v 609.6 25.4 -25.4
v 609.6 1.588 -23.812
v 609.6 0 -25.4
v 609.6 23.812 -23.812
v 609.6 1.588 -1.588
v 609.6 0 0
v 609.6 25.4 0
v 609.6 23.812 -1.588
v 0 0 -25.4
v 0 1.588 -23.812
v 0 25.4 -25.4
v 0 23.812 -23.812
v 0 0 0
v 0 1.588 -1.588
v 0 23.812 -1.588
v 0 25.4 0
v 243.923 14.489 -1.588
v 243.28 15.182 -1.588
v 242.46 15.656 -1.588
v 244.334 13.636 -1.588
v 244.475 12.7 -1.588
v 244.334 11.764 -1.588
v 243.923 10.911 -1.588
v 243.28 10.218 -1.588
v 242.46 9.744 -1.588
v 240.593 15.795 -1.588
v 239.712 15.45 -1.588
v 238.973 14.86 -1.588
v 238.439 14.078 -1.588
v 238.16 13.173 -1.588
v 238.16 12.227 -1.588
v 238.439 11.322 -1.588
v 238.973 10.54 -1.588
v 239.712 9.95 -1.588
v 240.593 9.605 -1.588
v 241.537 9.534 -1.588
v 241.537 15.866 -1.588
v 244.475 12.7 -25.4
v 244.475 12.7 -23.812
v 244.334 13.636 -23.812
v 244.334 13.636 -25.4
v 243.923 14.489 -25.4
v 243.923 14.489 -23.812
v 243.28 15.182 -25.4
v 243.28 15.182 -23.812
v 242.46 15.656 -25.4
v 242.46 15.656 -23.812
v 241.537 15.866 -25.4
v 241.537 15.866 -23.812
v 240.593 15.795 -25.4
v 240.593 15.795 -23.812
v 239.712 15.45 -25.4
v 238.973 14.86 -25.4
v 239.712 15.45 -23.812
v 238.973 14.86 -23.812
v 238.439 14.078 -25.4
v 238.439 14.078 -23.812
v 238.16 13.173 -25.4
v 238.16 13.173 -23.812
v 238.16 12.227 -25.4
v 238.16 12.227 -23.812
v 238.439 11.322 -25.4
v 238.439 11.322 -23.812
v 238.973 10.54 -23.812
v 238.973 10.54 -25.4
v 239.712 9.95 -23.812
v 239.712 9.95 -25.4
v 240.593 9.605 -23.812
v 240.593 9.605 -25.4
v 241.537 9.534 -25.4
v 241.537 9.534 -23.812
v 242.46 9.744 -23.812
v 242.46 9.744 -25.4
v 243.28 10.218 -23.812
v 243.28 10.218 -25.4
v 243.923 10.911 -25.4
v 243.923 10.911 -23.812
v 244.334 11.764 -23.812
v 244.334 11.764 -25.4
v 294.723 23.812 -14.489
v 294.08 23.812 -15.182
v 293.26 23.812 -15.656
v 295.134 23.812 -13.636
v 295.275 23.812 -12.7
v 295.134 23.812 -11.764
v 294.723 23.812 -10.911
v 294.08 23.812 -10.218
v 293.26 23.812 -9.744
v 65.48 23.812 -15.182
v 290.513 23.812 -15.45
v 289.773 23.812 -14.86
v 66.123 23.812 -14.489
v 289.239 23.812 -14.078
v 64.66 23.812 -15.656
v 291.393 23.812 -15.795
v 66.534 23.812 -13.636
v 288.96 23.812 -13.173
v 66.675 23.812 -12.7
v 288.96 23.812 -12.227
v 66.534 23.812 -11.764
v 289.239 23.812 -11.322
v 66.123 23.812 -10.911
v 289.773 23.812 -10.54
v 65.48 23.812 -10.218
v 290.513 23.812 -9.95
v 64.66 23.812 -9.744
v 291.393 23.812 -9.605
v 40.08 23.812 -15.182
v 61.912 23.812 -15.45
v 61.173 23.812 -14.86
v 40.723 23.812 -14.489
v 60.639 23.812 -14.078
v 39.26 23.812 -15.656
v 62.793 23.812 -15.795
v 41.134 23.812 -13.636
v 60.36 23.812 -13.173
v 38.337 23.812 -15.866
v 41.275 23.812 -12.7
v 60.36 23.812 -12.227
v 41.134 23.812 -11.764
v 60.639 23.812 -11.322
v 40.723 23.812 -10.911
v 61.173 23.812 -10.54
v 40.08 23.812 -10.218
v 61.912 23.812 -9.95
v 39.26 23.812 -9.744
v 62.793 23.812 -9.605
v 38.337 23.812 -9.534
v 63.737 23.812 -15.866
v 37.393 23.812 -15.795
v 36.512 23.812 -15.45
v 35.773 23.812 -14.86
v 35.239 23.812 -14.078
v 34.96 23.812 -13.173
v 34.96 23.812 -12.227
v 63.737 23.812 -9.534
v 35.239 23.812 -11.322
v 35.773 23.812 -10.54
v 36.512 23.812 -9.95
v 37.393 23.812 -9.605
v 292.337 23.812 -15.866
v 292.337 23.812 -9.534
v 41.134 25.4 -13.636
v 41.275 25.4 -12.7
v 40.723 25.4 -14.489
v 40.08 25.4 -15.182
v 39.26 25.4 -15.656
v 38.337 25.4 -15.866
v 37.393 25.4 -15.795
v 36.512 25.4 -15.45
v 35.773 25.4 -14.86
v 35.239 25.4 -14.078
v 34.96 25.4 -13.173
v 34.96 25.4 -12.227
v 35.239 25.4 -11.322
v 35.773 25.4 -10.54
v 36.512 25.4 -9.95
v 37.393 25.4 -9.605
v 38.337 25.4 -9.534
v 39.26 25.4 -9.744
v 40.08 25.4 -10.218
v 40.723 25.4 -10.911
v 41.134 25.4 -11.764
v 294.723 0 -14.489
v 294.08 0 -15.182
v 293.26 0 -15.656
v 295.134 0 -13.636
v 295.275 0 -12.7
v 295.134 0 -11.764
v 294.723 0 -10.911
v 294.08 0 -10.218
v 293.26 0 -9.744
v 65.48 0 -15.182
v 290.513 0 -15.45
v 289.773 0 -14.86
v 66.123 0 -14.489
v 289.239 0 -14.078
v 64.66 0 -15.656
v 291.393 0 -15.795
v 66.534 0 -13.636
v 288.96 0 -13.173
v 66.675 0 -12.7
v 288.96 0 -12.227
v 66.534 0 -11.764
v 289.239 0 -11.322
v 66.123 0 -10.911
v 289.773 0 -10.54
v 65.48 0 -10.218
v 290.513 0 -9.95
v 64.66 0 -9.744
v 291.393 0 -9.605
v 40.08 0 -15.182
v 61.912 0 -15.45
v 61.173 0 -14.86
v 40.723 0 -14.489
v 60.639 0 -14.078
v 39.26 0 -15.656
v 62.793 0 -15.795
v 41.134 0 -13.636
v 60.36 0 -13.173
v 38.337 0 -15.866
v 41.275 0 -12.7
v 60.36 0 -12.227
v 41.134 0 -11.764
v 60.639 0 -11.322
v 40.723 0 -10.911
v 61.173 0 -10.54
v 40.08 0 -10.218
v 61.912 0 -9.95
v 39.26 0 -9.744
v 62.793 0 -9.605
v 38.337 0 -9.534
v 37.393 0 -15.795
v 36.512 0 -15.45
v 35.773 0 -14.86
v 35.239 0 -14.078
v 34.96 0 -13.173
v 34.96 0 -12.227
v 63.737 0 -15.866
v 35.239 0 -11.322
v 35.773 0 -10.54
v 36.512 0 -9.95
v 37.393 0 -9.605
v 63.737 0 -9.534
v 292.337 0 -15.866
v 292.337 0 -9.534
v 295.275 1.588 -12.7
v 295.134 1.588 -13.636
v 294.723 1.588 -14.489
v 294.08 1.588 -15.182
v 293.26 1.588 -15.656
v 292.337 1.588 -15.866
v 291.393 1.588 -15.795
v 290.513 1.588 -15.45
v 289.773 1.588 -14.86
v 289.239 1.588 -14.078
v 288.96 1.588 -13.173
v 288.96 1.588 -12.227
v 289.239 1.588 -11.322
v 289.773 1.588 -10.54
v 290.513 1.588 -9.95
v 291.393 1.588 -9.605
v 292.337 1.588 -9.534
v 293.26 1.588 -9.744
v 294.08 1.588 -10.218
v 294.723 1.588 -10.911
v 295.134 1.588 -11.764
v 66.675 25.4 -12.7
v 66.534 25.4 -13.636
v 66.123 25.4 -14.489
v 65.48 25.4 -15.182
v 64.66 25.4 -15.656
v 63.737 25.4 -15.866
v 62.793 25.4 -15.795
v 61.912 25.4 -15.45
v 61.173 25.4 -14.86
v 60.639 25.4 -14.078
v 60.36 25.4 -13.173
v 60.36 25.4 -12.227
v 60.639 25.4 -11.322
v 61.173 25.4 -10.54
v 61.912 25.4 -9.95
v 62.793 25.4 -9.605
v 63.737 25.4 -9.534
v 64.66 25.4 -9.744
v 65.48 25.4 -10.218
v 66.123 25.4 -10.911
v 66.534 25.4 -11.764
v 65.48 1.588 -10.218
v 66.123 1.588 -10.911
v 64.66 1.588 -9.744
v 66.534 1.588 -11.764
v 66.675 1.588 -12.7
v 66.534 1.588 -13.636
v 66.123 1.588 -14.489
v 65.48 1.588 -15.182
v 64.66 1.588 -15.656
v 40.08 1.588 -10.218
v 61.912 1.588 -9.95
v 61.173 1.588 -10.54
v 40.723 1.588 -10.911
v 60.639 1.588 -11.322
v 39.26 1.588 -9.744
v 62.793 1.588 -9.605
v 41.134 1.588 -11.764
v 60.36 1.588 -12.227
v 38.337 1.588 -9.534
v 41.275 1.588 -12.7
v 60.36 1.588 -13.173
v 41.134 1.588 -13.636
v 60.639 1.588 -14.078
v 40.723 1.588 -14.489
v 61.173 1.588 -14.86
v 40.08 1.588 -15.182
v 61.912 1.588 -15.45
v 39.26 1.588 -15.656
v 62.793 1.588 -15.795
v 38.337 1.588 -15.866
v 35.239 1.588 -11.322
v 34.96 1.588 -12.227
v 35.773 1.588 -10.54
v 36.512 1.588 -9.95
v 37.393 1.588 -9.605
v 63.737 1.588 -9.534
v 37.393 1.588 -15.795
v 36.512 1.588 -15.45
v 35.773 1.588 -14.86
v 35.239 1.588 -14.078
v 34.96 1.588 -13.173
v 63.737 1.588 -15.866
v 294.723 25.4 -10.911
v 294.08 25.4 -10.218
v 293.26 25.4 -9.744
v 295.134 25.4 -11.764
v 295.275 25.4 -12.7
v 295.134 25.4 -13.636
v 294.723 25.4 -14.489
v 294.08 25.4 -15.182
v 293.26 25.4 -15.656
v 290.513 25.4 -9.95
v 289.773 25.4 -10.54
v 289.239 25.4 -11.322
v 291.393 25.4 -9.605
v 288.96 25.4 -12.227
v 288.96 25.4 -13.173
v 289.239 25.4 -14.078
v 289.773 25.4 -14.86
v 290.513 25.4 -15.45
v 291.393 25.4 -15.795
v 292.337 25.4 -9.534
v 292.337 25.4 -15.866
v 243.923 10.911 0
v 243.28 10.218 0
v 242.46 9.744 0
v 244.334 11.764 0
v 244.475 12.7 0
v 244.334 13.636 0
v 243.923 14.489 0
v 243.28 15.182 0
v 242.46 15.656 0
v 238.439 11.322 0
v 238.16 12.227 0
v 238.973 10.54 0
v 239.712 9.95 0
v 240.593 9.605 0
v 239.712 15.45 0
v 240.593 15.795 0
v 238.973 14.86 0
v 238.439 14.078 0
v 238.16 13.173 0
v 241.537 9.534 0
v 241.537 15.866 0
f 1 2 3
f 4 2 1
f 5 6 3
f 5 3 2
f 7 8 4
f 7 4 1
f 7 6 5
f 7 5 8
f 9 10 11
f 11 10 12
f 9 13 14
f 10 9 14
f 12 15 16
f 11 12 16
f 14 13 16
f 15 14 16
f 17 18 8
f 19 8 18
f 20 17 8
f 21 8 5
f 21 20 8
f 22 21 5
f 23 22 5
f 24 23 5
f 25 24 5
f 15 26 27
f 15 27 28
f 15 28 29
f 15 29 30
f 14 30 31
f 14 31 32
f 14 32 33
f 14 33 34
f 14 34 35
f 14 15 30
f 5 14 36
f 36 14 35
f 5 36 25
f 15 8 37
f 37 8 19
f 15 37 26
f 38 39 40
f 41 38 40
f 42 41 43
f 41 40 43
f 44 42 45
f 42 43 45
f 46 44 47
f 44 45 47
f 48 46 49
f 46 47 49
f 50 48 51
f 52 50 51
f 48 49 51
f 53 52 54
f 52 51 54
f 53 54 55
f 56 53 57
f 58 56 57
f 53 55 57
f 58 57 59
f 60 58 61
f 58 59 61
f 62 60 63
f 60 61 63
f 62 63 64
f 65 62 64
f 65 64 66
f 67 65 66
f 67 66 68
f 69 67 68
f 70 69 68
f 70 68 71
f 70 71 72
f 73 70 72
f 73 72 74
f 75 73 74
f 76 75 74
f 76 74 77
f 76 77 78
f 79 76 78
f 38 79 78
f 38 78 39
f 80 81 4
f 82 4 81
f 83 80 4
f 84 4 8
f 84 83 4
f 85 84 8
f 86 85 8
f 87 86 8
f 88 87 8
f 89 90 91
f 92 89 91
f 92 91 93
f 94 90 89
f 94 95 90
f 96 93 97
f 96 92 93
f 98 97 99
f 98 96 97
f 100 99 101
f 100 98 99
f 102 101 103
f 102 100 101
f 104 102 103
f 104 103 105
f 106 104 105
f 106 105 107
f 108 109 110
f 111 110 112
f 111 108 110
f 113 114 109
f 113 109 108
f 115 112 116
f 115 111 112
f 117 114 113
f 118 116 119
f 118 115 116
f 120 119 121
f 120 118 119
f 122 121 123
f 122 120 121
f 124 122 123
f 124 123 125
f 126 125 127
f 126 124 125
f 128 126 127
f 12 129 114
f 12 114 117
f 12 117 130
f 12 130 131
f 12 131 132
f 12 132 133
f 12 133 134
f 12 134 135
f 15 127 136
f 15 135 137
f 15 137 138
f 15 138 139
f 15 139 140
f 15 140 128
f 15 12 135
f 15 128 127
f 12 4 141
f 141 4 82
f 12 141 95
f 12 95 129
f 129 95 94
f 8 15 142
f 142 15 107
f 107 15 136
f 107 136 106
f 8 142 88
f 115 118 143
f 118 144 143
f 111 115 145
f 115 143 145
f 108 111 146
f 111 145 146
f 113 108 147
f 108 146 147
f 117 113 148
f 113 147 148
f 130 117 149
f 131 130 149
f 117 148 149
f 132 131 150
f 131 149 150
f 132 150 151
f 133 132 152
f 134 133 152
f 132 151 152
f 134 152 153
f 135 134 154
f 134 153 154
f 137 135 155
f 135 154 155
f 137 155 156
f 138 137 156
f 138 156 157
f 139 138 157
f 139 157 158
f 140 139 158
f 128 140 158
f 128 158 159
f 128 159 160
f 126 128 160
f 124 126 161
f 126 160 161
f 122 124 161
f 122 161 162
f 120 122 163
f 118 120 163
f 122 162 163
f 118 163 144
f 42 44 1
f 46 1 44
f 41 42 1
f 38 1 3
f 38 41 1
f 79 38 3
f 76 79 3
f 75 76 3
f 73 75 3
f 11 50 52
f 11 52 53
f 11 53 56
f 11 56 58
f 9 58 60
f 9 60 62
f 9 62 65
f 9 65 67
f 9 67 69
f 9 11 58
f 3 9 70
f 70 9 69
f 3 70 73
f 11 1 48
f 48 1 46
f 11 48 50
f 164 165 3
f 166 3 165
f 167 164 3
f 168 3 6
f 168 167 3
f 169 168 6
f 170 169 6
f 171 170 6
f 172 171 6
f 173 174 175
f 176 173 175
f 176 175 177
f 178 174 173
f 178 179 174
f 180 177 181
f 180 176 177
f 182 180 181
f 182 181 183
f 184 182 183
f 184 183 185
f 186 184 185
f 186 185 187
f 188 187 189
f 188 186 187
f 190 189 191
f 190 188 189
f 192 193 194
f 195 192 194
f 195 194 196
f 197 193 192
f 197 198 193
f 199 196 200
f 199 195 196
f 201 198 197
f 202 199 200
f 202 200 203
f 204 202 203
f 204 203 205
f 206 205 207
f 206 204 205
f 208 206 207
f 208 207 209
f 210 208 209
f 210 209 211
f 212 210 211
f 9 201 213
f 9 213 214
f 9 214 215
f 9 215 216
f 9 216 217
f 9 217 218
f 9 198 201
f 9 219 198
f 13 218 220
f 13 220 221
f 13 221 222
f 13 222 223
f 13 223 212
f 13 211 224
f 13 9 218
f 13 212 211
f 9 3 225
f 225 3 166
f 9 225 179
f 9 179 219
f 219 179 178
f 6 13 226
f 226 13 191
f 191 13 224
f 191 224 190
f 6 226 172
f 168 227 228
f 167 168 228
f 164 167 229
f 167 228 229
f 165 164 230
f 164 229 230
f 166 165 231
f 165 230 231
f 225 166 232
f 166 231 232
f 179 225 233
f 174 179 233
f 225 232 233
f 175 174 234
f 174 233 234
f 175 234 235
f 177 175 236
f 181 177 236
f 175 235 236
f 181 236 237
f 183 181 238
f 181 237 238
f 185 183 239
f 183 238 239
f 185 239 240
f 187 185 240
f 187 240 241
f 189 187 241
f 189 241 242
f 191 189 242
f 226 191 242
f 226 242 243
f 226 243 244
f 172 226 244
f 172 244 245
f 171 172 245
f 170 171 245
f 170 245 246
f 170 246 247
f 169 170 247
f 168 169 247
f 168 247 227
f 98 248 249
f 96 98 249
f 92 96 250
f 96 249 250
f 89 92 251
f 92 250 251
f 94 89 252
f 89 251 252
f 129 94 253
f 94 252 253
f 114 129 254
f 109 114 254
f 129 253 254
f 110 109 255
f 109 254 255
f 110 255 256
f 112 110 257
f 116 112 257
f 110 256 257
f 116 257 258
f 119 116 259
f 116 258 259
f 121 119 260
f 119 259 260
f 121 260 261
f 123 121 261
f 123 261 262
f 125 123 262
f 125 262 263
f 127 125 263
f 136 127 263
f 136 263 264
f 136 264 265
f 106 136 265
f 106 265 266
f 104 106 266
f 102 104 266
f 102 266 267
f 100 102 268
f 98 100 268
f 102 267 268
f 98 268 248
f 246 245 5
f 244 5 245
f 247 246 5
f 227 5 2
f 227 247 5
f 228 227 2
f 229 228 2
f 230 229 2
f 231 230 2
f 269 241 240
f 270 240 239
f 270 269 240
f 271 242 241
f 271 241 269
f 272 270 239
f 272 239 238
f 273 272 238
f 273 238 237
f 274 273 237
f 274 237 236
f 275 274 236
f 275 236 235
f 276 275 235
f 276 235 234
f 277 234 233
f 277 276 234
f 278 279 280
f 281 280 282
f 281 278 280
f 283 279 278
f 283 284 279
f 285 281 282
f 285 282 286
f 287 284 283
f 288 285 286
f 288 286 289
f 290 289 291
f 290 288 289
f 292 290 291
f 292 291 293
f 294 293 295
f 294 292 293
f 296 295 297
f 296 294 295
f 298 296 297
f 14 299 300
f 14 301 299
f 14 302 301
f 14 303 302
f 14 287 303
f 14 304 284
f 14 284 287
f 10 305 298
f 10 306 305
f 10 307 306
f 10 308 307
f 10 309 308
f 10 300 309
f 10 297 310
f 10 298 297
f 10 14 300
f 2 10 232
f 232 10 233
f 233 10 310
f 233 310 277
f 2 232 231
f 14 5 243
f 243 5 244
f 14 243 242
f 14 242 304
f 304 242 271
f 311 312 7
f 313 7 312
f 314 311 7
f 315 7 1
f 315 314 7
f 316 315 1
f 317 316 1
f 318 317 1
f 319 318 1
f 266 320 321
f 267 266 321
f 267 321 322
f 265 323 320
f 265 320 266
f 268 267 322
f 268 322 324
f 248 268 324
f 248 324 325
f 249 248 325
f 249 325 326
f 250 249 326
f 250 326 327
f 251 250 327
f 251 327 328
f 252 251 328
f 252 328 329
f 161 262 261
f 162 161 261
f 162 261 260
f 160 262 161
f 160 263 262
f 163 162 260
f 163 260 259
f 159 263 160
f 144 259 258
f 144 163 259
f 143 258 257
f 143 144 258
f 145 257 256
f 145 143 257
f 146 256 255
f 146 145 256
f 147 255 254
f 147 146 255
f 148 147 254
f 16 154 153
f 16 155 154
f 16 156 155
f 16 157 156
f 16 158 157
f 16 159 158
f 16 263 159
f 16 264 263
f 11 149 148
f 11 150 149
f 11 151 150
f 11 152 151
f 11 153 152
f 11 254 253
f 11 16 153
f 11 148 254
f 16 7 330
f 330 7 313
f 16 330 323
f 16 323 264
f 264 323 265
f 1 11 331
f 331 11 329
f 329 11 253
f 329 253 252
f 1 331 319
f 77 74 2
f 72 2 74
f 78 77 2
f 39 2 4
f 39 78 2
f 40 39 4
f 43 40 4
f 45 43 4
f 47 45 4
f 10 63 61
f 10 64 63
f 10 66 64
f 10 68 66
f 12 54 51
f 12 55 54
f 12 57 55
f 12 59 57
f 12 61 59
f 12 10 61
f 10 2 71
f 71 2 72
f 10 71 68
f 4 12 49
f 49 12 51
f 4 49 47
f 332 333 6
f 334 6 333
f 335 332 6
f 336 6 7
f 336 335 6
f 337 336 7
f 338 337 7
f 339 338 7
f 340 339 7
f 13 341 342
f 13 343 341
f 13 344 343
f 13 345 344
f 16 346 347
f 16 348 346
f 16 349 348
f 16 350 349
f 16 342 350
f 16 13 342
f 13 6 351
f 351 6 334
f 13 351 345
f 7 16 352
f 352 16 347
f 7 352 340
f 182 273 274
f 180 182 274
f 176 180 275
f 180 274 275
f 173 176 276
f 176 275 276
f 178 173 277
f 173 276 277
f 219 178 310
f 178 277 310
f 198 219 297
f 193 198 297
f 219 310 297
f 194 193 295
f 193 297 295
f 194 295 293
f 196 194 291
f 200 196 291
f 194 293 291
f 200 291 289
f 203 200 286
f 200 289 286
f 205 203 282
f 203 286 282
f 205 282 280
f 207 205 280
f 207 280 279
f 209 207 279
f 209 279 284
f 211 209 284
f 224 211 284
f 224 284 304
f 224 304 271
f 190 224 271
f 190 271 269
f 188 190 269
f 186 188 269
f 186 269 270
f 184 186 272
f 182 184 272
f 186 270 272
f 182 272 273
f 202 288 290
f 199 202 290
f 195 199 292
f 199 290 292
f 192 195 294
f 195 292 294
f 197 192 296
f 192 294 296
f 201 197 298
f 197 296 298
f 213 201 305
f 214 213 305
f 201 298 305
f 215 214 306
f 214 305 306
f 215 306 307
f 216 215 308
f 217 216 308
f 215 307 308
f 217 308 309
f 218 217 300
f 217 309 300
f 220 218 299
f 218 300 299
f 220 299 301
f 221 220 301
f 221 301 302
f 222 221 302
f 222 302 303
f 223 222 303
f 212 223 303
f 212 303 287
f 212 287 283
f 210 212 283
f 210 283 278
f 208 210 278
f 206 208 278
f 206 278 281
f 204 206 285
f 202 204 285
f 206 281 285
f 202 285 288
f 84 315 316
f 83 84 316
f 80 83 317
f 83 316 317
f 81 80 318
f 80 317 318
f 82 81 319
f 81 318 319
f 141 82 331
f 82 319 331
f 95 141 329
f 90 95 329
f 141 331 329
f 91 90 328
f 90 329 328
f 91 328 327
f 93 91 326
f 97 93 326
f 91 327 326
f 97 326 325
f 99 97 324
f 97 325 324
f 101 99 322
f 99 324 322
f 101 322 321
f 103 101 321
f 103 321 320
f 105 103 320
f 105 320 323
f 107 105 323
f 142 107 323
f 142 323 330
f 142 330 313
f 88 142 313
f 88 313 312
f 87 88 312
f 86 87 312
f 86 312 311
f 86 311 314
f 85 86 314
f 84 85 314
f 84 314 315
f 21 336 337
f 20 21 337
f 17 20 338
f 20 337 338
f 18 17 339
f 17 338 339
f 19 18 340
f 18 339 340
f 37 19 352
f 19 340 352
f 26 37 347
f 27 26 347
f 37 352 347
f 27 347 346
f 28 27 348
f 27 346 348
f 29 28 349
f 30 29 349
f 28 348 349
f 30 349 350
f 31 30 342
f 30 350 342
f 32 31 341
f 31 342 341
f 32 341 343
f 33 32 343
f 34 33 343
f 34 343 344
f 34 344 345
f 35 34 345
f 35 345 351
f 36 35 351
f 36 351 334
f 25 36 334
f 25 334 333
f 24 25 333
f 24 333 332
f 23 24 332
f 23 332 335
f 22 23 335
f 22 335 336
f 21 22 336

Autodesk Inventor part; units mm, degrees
ref_plane "YZ Plane" through (0, 0, 0) normal (1, 0, 0) x (0, 1, 0)
ref_plane "XZ Plane" through (0, 0, 0) normal (0, 1, 0) x (-1, 0, 0)
ref_plane "XY Plane" through (0, 0, 0) normal (0, 0, 1) x (1, 0, 0)
sketch "Sketch1" plane through (0, 0, 0) normal (1, 0, 0) x (0, 1, 0)
  line L0 (0, 0) -> (25.4, 0)
  line L1 (25.4, 0) -> (25.4, -25.4)
  line L2 (25.4, -25.4) -> (0, -25.4)
  line L3 (0, -25.4) -> (0, 0)
  line L4 (23.8125, -1.5875) -> (1.5875, -1.5875)
  line L5 (1.5875, -1.5875) -> (1.5875, -23.8125)
  line L6 (1.5875, -23.8125) -> (23.8125, -23.8125)
  line L7 (23.8125, -23.8125) -> (23.8125, -1.5875)
  dimension "d0" = 25.4
  dimension "d1" = 25.4
  dimension "d2" = 1.5875
extrude "Extrusion1" add sketch "Sketch1" along normal blind 609.6
sketch "Sketch2" plane through (0, 25.4, 0) normal (0, 1, 0) x (1, 0, 0)
  line L0 (0, 1.5875) -> (0, 23.8125) projected
  line L1 (0, 12.7) -> (64.9449, 12.7) construction
  circle A0 centre (38.1, 12.7) radius 3.175
  circle A1 centre (63.5, 12.7) radius 3.175
  circle A2 centre (292.1, 12.7) radius 3.175
  point P0 (0, 0)
  dimension "d5" = 6.35
  dimension "d6" = 38.1
  dimension "d7" = 63.5
  dimension "d8" = 292.1
extrude "Extrusion2" cut sketch "Sketch2" against normal blind 25.4
sketch "Sketch3" plane through (0, 0, 0) normal (0, 0, 1) x (1, 0, 0)
  line L0 (0, 23.8125) -> (0, 1.5875) projected
  line L1 (0, 12.7) -> (84.2174, 12.7) construction
  circle A0 centre (241.3, 12.7) radius 3.175
  point P0 (0, 0)
  dimension "d11" = 6.35
  dimension "d12" = 241.3
extrude "Extrusion3" cut sketch "Sketch3" against normal blind 25.4
properties part number "Short horizontal"
